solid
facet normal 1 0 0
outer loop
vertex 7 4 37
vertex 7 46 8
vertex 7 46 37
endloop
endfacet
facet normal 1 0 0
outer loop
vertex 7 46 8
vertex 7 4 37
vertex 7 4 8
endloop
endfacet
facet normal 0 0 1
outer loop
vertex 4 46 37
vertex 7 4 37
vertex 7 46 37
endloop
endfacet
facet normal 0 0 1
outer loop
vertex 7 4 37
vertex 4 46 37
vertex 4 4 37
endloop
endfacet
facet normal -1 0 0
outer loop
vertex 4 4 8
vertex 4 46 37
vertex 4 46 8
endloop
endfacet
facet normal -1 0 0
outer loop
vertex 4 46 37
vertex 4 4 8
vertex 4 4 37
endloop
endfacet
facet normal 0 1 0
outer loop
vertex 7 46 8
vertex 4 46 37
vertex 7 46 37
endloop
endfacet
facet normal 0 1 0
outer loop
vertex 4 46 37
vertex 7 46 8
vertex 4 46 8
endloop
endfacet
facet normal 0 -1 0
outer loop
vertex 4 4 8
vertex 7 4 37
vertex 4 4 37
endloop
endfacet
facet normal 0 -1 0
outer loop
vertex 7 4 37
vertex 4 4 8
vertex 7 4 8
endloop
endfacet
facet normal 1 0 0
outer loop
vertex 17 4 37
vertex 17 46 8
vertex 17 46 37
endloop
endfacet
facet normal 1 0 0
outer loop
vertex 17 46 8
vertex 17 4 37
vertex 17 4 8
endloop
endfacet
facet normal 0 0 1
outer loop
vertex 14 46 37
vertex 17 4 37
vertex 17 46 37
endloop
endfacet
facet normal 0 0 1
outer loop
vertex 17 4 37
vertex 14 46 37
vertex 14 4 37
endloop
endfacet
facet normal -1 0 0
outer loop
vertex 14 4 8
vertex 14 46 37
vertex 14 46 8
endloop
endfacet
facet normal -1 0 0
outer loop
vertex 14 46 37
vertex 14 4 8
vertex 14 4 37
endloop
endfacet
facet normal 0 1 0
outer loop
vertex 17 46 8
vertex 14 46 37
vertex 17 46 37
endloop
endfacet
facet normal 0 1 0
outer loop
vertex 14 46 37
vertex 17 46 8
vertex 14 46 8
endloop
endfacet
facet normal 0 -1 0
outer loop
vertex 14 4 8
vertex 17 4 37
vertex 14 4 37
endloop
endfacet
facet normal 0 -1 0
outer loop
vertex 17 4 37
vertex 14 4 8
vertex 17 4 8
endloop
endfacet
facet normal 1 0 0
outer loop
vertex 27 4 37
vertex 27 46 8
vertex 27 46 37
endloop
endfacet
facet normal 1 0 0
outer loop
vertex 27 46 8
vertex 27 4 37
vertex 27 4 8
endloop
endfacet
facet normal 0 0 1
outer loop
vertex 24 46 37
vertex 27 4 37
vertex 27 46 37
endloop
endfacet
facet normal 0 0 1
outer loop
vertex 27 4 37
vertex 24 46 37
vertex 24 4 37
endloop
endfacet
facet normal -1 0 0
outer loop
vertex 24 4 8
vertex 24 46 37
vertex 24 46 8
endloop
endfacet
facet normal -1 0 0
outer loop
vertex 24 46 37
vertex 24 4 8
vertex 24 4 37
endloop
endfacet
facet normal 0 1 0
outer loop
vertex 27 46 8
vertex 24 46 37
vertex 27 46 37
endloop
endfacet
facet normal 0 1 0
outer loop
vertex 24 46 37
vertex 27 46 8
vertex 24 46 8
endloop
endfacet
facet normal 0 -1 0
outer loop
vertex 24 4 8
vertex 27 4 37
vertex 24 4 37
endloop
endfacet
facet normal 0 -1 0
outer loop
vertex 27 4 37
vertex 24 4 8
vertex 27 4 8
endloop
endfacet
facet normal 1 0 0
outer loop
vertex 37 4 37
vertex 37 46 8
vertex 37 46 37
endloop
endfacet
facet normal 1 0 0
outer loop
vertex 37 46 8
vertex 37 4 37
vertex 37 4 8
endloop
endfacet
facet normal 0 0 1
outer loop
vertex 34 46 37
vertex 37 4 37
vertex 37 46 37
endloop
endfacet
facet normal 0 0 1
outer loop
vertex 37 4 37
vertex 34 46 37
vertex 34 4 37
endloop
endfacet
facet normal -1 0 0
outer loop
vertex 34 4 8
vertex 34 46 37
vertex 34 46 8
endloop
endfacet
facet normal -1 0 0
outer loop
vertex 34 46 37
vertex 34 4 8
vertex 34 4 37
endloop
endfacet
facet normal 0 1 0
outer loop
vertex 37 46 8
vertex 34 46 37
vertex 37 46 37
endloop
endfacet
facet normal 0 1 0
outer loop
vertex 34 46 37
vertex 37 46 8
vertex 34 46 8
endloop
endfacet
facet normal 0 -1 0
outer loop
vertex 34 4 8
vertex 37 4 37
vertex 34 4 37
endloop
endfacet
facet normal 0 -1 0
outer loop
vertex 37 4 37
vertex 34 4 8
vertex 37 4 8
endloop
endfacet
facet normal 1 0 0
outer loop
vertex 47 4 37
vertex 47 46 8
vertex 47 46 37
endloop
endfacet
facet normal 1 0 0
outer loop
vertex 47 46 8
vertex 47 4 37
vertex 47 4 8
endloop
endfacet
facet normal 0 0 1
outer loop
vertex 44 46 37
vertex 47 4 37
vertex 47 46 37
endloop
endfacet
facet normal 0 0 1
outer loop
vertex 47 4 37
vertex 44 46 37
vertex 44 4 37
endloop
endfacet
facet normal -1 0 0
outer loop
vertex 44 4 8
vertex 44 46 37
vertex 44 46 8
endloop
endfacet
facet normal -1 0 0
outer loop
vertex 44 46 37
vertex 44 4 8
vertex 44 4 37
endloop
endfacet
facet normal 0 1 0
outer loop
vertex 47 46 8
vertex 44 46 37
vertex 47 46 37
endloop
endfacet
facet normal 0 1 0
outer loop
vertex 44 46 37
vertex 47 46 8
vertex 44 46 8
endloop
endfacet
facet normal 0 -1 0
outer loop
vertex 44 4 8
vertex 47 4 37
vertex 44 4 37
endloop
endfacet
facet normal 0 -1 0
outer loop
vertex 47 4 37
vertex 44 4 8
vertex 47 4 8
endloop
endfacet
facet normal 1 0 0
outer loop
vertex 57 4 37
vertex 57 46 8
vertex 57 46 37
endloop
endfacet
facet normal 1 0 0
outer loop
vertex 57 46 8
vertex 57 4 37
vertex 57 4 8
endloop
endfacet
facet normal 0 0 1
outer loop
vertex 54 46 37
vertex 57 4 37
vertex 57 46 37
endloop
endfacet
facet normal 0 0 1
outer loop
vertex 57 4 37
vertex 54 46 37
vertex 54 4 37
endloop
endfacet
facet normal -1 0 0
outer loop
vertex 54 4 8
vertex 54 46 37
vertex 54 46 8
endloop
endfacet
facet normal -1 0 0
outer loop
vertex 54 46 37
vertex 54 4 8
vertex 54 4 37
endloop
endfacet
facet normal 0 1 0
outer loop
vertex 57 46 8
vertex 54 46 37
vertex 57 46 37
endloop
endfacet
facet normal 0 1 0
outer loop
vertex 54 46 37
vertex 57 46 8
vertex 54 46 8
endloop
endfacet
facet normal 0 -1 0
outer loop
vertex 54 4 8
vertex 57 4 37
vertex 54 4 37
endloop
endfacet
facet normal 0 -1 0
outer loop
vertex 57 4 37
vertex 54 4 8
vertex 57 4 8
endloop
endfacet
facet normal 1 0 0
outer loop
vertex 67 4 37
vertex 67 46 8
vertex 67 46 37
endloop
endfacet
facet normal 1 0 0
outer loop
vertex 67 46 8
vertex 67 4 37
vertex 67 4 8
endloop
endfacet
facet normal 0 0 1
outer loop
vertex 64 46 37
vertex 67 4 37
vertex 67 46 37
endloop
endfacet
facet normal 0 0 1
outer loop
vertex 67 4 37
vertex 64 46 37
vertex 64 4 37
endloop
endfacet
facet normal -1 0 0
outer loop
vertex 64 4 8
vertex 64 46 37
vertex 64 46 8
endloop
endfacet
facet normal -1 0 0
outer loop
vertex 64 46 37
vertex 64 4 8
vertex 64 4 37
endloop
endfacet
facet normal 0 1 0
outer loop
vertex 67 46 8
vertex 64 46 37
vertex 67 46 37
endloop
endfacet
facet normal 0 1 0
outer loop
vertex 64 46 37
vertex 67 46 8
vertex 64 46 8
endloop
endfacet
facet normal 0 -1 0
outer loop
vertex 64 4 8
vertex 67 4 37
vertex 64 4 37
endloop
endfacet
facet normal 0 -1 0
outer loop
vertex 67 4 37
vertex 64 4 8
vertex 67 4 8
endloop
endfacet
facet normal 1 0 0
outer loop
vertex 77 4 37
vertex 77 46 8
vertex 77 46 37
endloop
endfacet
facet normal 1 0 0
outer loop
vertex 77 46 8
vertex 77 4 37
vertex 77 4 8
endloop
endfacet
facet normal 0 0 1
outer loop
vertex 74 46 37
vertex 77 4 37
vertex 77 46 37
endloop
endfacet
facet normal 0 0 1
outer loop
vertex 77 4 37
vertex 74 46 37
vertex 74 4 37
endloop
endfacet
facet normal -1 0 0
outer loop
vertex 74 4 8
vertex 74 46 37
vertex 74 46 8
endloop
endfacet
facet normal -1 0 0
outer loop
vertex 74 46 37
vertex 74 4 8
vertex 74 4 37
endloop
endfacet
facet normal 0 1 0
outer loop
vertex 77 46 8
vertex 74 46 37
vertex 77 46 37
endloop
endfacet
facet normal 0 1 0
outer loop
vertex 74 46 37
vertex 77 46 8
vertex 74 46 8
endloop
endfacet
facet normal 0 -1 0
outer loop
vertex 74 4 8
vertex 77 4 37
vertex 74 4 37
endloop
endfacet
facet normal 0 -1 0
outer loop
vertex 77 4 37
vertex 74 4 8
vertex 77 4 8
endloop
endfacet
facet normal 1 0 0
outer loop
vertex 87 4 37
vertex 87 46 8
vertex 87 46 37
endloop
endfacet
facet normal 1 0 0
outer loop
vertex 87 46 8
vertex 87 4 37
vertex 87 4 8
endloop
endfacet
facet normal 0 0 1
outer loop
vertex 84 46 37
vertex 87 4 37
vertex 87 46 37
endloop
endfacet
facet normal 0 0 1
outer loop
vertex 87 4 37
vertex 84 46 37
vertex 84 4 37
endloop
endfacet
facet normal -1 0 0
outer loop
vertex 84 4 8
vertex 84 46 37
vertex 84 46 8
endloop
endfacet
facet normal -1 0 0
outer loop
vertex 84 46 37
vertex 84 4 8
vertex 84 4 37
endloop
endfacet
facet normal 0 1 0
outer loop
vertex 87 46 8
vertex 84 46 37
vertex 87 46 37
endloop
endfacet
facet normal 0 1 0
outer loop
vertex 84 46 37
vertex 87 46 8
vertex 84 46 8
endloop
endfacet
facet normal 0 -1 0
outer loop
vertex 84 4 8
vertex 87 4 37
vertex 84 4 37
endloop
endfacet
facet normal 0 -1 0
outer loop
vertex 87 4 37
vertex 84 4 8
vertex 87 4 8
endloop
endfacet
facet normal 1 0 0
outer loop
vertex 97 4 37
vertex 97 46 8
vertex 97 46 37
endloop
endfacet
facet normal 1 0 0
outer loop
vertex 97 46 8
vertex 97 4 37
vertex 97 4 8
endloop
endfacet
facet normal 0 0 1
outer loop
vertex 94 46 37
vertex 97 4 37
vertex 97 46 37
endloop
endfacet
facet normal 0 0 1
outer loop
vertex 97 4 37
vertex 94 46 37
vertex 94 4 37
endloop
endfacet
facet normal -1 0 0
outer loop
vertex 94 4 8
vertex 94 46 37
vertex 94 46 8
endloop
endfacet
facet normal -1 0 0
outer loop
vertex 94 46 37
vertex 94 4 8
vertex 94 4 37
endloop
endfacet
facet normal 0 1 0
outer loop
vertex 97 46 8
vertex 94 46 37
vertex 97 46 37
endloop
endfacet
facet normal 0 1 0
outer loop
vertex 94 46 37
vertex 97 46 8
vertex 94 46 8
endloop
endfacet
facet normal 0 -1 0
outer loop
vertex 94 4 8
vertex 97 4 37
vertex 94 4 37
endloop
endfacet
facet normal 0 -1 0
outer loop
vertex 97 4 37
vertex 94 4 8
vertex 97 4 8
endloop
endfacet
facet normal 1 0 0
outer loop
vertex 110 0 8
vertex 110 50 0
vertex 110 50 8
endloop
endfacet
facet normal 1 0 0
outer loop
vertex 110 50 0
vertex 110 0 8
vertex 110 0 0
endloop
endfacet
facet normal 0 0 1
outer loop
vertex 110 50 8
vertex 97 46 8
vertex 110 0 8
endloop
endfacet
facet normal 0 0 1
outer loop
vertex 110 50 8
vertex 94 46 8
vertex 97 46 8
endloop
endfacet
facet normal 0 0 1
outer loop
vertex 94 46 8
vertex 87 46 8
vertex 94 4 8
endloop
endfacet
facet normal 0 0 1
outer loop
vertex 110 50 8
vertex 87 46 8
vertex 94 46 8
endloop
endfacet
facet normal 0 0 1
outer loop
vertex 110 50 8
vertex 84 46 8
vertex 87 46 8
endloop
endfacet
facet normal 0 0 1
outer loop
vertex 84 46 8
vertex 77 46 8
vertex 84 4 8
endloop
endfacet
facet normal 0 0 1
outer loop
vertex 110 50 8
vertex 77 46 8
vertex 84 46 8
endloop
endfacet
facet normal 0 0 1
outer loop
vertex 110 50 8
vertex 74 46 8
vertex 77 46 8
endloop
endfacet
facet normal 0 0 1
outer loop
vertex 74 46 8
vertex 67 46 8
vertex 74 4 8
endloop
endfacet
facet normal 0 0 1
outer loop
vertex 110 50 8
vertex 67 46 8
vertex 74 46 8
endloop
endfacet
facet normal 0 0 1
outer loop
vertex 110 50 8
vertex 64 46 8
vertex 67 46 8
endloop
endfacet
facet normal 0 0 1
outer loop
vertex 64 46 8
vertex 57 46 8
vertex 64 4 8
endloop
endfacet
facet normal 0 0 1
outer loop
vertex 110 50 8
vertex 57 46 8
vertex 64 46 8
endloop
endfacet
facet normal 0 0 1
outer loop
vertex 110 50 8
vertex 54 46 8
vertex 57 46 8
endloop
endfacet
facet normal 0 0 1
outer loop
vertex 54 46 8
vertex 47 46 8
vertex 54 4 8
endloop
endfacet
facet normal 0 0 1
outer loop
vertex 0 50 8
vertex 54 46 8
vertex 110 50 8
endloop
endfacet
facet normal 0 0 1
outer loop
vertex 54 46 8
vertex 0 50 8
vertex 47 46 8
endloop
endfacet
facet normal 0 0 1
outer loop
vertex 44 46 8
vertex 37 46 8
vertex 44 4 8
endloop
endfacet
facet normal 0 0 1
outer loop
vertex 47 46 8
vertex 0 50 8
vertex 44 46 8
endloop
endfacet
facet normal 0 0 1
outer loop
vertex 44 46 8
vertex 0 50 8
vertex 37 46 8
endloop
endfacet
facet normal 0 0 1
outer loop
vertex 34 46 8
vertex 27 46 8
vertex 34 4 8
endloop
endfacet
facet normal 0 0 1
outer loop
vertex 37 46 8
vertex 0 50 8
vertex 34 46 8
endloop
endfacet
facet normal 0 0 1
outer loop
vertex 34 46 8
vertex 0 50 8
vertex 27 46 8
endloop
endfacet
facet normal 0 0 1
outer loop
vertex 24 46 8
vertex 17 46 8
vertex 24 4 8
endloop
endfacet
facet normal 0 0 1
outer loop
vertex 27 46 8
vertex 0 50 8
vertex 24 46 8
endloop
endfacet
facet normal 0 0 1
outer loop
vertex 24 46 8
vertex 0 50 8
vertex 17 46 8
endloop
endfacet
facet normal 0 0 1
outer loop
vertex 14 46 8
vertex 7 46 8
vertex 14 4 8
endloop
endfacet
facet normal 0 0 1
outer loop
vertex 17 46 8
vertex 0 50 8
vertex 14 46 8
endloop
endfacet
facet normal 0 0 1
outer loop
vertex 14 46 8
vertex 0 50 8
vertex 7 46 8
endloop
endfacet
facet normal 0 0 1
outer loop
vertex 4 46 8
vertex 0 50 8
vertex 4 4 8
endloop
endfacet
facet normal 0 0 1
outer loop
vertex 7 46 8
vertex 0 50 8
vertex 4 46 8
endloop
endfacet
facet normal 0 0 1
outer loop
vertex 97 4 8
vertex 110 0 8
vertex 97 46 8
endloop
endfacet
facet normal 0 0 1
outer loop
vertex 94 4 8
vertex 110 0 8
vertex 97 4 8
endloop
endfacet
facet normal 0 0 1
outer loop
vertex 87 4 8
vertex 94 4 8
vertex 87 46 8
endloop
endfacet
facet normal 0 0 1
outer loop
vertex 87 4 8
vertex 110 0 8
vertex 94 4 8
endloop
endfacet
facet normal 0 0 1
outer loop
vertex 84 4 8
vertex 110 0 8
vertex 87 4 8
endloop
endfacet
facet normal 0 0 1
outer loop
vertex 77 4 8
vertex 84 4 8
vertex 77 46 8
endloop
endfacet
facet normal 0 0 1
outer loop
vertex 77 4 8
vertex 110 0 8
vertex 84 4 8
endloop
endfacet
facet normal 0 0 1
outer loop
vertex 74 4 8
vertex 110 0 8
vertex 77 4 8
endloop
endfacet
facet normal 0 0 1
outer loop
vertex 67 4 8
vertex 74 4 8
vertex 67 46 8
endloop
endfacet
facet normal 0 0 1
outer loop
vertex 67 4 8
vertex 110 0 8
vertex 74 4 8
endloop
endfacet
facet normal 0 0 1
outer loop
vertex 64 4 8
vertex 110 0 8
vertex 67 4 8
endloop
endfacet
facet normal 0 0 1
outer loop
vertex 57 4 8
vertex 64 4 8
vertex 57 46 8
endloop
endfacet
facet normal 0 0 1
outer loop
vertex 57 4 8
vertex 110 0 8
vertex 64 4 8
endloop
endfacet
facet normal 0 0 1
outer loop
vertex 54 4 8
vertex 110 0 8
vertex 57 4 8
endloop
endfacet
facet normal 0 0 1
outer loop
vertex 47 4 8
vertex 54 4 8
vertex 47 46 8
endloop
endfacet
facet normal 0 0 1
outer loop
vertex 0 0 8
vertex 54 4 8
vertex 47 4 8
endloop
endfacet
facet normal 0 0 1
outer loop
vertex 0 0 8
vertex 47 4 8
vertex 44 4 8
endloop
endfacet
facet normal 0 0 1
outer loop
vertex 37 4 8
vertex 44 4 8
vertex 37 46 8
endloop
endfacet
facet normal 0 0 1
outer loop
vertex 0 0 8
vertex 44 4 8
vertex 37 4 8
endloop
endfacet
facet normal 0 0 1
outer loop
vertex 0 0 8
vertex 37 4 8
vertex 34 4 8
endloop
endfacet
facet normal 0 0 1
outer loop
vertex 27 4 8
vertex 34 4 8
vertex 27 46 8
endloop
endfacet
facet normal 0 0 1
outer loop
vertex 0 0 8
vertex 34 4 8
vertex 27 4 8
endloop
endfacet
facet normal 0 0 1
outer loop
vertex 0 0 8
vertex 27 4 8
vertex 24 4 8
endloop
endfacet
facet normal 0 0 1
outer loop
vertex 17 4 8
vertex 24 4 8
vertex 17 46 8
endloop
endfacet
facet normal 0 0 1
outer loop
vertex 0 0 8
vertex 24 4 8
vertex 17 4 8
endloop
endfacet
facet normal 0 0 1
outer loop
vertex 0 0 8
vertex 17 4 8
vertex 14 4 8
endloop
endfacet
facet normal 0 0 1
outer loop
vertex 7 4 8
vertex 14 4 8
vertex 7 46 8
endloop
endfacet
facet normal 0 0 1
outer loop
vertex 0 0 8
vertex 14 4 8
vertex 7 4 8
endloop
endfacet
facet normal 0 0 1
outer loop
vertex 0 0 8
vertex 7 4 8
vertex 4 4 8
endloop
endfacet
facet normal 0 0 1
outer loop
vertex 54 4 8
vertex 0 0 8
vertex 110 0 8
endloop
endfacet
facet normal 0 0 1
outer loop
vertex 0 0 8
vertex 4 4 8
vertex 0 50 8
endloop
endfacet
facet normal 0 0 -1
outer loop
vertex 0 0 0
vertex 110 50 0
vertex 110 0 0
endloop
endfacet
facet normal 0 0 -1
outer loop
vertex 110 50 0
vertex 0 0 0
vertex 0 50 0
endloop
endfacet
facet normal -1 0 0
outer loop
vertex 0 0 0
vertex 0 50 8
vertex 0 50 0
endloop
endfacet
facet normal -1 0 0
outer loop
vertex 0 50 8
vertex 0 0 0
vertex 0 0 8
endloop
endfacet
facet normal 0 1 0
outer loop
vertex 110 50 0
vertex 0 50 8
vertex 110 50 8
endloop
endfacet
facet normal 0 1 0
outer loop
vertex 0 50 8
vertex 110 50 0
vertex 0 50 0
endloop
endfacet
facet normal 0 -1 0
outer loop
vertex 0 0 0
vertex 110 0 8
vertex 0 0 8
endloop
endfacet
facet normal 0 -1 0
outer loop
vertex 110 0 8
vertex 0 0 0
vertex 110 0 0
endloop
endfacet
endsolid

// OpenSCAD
$fn = 32;

// ----------------------------------------------------------------------
// Heatsink: uniform fin block
// ----------------------------------------------------------------------

// --- parameters (mm) ---
base_l = 110;             // base length, X
base_w = 50;              // base width, Y
base_t = 8;               // base plate thickness
fin_h = 30;               // fin height above the base
fin_t = 3;                // fin thickness
edge = 4;                 // margin from the base ends
pitch = 10;               // fin pitch

n_fins = floor((base_l - 2 * edge - fin_t) / pitch) + 1;  // fin count
total_h = base_t + fin_h - 1;  // overall height

union() {
  cube([base_l, base_w, base_t]);
  for (i = [0 : n_fins - 1])
    translate([edge + i * pitch, edge, base_t - 1])
      cube([fin_t, base_w - 2 * edge, fin_h]);
}
